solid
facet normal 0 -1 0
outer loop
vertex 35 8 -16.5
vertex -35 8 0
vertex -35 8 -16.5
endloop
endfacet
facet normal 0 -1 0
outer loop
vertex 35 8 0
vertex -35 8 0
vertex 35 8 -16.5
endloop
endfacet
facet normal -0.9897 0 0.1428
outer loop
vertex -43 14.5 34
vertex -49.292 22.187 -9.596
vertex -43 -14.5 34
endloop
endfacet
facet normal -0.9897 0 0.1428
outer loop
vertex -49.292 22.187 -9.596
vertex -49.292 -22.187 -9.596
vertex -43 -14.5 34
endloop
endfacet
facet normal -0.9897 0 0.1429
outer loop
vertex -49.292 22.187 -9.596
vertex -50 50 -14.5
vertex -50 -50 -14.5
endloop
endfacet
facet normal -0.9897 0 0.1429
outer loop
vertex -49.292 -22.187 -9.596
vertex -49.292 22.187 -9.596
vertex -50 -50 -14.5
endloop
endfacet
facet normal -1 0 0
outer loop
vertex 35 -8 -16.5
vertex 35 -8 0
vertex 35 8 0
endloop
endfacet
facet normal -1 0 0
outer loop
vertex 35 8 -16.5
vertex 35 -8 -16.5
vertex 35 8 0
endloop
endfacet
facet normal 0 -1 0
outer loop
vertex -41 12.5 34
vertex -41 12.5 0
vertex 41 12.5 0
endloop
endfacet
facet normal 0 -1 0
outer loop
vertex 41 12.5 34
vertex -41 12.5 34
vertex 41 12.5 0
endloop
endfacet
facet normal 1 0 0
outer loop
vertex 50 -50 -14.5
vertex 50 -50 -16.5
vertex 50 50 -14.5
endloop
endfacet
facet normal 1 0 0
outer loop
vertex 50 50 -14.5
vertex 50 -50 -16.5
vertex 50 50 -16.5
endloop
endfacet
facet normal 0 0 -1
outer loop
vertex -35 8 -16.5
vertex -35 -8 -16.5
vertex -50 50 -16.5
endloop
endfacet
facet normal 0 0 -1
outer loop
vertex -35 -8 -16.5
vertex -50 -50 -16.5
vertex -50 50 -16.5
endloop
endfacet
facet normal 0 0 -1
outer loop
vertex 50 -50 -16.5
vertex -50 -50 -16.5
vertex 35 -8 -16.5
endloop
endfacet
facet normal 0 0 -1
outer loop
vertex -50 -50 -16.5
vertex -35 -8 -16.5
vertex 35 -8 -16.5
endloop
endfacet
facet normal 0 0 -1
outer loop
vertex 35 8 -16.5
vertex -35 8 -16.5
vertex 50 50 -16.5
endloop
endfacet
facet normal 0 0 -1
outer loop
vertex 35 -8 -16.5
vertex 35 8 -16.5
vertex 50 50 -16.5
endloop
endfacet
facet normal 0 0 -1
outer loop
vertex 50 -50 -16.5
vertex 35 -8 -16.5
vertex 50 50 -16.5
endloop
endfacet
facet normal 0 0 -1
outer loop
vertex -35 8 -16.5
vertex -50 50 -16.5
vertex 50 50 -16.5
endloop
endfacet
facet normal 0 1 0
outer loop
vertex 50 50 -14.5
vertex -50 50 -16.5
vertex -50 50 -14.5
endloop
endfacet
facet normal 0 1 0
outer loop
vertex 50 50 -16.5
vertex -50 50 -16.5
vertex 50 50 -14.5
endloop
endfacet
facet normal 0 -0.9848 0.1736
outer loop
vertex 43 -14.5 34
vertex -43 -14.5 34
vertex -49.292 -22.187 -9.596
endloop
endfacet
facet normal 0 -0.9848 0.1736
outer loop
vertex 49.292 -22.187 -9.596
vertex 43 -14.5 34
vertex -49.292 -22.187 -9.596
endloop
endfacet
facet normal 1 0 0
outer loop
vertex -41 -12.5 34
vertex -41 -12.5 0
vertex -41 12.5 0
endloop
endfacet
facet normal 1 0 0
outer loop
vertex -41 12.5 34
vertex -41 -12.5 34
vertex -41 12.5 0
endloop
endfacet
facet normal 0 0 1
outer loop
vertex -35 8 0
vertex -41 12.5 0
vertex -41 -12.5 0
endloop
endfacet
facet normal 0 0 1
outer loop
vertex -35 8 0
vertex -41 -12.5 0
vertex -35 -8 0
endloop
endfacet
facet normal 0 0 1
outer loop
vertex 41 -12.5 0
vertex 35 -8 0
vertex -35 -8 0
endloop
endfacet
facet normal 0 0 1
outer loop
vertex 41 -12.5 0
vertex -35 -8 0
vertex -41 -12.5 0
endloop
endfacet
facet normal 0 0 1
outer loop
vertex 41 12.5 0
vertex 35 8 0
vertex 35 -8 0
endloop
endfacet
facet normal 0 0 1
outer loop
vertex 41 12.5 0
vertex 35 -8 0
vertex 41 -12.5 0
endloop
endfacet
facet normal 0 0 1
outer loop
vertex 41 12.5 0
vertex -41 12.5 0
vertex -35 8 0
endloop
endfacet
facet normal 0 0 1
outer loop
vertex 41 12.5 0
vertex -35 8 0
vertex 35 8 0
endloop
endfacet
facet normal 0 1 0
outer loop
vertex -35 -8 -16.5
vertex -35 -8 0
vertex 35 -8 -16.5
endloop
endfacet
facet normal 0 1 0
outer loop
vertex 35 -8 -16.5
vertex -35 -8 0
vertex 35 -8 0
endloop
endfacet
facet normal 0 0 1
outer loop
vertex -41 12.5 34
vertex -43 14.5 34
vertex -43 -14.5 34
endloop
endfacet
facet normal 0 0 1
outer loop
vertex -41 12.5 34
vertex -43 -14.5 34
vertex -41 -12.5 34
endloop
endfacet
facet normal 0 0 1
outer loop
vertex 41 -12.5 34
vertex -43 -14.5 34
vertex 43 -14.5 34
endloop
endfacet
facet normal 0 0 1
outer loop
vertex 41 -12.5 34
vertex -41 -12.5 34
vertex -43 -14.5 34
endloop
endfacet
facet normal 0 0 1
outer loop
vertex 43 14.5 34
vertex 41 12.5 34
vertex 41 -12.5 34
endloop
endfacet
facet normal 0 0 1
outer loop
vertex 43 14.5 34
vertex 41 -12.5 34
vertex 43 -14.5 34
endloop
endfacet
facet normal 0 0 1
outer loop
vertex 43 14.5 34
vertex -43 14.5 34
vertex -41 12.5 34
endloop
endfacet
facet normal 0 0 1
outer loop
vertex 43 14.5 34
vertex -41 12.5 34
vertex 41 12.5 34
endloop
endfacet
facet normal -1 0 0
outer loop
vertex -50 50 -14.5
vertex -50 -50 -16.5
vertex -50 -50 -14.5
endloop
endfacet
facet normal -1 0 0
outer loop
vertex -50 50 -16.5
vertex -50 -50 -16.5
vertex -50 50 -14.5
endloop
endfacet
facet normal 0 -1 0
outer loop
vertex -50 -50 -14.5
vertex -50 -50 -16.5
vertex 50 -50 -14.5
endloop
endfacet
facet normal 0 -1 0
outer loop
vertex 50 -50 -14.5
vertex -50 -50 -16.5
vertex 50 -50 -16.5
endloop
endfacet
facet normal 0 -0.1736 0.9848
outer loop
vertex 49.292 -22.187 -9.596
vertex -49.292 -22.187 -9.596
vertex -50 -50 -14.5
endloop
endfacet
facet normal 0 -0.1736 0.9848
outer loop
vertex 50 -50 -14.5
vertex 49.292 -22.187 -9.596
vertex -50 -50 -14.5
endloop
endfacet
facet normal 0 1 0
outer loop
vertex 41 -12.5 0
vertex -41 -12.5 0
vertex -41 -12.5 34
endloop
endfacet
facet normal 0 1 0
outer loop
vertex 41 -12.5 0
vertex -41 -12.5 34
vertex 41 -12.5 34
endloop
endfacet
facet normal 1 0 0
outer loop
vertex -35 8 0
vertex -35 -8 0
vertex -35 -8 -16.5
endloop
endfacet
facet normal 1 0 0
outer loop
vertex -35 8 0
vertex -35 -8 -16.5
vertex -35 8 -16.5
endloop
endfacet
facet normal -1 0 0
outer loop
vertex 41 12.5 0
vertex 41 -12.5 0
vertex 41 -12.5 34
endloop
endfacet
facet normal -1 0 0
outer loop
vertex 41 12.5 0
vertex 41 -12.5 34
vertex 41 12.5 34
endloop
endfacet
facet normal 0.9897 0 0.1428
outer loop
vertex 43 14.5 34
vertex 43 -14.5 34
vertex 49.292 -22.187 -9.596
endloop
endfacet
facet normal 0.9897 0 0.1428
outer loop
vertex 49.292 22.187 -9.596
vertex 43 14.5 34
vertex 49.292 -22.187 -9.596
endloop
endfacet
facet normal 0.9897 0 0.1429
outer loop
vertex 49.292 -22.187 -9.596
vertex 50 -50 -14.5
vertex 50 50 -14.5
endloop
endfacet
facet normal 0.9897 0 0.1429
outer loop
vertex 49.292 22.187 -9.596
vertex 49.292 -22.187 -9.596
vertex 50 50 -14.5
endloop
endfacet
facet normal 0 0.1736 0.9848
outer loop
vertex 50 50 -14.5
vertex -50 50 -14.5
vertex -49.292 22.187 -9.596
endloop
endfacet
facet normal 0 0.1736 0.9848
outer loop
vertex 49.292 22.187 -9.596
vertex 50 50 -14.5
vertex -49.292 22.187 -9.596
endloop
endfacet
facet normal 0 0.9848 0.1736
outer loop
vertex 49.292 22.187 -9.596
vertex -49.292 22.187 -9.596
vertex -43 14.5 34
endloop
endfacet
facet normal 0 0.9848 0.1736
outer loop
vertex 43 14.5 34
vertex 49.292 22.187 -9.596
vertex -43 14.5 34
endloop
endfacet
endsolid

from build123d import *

# Parameters (mm, degrees)
F0_W          = 100
F0_H          = 100
F0_W_2        = 82
F0_H_2        = 25
F1_DEPTH      = 16.5
F2_DEPTH      = 34
F4_DEPTH      = 100.001
F6_DEPTH      = 50.001
F6_DEPTH_BACK = 50.001
F7_W          = 70
F7_H          = 16
F8_DEPTH      = 16.501


with BuildPart() as f1:
    # F0 (on Top) → F1 (new body)
    with BuildSketch(Plane.XY):
        Rectangle(F0_W, F0_H)
        Rectangle(F0_W_2, F0_H_2, mode=Mode.SUBTRACT)
        Rectangle(F0_W_2, F0_H_2)
    extrude(amount=-F1_DEPTH)

    # F0 (on Top) → F2 (join)
    with BuildSketch(Plane.XY):
        Rectangle(F0_W, F0_H)
        Rectangle(F0_W_2, F0_H_2, mode=Mode.SUBTRACT)
    extrude(amount=F2_DEPTH)

    # F3 (on face) → F4 (cut, through all)
    with BuildSketch(Plane(origin=(-50, 0, 0), x_dir=(0, -1, 0), z_dir=(-1, 0, 0))):
        Polygon((50, 34), (14.5, 34), (22.1871227195, -9.5958393243), (50, -14.5), align=None)
        Polygon((-22.1871227195, -9.5958393243), (-14.5, 34), (-50, 34), (-50, -14.5), align=None)
    extrude(amount=-F4_DEPTH, mode=Mode.SUBTRACT)

    # F5 (on Front) → F6 (cut, two sides)
    with BuildSketch(Plane.XZ) as f6_sk:
        Polygon((-50, -14.5), (-43, 34), (-50, 34), align=None)
        Polygon((50, 34), (43, 34), (50, -14.5), align=None)
    extrude(amount=-F6_DEPTH, mode=Mode.SUBTRACT)
    extrude(f6_sk.sketch, amount=F6_DEPTH_BACK, mode=Mode.SUBTRACT)

    # F7 (on face) → F8 (cut, through all)
    with BuildSketch(Plane.XY):
        Rectangle(F7_W, F7_H)
    extrude(amount=-F8_DEPTH, mode=Mode.SUBTRACT)


solid = f1.part
